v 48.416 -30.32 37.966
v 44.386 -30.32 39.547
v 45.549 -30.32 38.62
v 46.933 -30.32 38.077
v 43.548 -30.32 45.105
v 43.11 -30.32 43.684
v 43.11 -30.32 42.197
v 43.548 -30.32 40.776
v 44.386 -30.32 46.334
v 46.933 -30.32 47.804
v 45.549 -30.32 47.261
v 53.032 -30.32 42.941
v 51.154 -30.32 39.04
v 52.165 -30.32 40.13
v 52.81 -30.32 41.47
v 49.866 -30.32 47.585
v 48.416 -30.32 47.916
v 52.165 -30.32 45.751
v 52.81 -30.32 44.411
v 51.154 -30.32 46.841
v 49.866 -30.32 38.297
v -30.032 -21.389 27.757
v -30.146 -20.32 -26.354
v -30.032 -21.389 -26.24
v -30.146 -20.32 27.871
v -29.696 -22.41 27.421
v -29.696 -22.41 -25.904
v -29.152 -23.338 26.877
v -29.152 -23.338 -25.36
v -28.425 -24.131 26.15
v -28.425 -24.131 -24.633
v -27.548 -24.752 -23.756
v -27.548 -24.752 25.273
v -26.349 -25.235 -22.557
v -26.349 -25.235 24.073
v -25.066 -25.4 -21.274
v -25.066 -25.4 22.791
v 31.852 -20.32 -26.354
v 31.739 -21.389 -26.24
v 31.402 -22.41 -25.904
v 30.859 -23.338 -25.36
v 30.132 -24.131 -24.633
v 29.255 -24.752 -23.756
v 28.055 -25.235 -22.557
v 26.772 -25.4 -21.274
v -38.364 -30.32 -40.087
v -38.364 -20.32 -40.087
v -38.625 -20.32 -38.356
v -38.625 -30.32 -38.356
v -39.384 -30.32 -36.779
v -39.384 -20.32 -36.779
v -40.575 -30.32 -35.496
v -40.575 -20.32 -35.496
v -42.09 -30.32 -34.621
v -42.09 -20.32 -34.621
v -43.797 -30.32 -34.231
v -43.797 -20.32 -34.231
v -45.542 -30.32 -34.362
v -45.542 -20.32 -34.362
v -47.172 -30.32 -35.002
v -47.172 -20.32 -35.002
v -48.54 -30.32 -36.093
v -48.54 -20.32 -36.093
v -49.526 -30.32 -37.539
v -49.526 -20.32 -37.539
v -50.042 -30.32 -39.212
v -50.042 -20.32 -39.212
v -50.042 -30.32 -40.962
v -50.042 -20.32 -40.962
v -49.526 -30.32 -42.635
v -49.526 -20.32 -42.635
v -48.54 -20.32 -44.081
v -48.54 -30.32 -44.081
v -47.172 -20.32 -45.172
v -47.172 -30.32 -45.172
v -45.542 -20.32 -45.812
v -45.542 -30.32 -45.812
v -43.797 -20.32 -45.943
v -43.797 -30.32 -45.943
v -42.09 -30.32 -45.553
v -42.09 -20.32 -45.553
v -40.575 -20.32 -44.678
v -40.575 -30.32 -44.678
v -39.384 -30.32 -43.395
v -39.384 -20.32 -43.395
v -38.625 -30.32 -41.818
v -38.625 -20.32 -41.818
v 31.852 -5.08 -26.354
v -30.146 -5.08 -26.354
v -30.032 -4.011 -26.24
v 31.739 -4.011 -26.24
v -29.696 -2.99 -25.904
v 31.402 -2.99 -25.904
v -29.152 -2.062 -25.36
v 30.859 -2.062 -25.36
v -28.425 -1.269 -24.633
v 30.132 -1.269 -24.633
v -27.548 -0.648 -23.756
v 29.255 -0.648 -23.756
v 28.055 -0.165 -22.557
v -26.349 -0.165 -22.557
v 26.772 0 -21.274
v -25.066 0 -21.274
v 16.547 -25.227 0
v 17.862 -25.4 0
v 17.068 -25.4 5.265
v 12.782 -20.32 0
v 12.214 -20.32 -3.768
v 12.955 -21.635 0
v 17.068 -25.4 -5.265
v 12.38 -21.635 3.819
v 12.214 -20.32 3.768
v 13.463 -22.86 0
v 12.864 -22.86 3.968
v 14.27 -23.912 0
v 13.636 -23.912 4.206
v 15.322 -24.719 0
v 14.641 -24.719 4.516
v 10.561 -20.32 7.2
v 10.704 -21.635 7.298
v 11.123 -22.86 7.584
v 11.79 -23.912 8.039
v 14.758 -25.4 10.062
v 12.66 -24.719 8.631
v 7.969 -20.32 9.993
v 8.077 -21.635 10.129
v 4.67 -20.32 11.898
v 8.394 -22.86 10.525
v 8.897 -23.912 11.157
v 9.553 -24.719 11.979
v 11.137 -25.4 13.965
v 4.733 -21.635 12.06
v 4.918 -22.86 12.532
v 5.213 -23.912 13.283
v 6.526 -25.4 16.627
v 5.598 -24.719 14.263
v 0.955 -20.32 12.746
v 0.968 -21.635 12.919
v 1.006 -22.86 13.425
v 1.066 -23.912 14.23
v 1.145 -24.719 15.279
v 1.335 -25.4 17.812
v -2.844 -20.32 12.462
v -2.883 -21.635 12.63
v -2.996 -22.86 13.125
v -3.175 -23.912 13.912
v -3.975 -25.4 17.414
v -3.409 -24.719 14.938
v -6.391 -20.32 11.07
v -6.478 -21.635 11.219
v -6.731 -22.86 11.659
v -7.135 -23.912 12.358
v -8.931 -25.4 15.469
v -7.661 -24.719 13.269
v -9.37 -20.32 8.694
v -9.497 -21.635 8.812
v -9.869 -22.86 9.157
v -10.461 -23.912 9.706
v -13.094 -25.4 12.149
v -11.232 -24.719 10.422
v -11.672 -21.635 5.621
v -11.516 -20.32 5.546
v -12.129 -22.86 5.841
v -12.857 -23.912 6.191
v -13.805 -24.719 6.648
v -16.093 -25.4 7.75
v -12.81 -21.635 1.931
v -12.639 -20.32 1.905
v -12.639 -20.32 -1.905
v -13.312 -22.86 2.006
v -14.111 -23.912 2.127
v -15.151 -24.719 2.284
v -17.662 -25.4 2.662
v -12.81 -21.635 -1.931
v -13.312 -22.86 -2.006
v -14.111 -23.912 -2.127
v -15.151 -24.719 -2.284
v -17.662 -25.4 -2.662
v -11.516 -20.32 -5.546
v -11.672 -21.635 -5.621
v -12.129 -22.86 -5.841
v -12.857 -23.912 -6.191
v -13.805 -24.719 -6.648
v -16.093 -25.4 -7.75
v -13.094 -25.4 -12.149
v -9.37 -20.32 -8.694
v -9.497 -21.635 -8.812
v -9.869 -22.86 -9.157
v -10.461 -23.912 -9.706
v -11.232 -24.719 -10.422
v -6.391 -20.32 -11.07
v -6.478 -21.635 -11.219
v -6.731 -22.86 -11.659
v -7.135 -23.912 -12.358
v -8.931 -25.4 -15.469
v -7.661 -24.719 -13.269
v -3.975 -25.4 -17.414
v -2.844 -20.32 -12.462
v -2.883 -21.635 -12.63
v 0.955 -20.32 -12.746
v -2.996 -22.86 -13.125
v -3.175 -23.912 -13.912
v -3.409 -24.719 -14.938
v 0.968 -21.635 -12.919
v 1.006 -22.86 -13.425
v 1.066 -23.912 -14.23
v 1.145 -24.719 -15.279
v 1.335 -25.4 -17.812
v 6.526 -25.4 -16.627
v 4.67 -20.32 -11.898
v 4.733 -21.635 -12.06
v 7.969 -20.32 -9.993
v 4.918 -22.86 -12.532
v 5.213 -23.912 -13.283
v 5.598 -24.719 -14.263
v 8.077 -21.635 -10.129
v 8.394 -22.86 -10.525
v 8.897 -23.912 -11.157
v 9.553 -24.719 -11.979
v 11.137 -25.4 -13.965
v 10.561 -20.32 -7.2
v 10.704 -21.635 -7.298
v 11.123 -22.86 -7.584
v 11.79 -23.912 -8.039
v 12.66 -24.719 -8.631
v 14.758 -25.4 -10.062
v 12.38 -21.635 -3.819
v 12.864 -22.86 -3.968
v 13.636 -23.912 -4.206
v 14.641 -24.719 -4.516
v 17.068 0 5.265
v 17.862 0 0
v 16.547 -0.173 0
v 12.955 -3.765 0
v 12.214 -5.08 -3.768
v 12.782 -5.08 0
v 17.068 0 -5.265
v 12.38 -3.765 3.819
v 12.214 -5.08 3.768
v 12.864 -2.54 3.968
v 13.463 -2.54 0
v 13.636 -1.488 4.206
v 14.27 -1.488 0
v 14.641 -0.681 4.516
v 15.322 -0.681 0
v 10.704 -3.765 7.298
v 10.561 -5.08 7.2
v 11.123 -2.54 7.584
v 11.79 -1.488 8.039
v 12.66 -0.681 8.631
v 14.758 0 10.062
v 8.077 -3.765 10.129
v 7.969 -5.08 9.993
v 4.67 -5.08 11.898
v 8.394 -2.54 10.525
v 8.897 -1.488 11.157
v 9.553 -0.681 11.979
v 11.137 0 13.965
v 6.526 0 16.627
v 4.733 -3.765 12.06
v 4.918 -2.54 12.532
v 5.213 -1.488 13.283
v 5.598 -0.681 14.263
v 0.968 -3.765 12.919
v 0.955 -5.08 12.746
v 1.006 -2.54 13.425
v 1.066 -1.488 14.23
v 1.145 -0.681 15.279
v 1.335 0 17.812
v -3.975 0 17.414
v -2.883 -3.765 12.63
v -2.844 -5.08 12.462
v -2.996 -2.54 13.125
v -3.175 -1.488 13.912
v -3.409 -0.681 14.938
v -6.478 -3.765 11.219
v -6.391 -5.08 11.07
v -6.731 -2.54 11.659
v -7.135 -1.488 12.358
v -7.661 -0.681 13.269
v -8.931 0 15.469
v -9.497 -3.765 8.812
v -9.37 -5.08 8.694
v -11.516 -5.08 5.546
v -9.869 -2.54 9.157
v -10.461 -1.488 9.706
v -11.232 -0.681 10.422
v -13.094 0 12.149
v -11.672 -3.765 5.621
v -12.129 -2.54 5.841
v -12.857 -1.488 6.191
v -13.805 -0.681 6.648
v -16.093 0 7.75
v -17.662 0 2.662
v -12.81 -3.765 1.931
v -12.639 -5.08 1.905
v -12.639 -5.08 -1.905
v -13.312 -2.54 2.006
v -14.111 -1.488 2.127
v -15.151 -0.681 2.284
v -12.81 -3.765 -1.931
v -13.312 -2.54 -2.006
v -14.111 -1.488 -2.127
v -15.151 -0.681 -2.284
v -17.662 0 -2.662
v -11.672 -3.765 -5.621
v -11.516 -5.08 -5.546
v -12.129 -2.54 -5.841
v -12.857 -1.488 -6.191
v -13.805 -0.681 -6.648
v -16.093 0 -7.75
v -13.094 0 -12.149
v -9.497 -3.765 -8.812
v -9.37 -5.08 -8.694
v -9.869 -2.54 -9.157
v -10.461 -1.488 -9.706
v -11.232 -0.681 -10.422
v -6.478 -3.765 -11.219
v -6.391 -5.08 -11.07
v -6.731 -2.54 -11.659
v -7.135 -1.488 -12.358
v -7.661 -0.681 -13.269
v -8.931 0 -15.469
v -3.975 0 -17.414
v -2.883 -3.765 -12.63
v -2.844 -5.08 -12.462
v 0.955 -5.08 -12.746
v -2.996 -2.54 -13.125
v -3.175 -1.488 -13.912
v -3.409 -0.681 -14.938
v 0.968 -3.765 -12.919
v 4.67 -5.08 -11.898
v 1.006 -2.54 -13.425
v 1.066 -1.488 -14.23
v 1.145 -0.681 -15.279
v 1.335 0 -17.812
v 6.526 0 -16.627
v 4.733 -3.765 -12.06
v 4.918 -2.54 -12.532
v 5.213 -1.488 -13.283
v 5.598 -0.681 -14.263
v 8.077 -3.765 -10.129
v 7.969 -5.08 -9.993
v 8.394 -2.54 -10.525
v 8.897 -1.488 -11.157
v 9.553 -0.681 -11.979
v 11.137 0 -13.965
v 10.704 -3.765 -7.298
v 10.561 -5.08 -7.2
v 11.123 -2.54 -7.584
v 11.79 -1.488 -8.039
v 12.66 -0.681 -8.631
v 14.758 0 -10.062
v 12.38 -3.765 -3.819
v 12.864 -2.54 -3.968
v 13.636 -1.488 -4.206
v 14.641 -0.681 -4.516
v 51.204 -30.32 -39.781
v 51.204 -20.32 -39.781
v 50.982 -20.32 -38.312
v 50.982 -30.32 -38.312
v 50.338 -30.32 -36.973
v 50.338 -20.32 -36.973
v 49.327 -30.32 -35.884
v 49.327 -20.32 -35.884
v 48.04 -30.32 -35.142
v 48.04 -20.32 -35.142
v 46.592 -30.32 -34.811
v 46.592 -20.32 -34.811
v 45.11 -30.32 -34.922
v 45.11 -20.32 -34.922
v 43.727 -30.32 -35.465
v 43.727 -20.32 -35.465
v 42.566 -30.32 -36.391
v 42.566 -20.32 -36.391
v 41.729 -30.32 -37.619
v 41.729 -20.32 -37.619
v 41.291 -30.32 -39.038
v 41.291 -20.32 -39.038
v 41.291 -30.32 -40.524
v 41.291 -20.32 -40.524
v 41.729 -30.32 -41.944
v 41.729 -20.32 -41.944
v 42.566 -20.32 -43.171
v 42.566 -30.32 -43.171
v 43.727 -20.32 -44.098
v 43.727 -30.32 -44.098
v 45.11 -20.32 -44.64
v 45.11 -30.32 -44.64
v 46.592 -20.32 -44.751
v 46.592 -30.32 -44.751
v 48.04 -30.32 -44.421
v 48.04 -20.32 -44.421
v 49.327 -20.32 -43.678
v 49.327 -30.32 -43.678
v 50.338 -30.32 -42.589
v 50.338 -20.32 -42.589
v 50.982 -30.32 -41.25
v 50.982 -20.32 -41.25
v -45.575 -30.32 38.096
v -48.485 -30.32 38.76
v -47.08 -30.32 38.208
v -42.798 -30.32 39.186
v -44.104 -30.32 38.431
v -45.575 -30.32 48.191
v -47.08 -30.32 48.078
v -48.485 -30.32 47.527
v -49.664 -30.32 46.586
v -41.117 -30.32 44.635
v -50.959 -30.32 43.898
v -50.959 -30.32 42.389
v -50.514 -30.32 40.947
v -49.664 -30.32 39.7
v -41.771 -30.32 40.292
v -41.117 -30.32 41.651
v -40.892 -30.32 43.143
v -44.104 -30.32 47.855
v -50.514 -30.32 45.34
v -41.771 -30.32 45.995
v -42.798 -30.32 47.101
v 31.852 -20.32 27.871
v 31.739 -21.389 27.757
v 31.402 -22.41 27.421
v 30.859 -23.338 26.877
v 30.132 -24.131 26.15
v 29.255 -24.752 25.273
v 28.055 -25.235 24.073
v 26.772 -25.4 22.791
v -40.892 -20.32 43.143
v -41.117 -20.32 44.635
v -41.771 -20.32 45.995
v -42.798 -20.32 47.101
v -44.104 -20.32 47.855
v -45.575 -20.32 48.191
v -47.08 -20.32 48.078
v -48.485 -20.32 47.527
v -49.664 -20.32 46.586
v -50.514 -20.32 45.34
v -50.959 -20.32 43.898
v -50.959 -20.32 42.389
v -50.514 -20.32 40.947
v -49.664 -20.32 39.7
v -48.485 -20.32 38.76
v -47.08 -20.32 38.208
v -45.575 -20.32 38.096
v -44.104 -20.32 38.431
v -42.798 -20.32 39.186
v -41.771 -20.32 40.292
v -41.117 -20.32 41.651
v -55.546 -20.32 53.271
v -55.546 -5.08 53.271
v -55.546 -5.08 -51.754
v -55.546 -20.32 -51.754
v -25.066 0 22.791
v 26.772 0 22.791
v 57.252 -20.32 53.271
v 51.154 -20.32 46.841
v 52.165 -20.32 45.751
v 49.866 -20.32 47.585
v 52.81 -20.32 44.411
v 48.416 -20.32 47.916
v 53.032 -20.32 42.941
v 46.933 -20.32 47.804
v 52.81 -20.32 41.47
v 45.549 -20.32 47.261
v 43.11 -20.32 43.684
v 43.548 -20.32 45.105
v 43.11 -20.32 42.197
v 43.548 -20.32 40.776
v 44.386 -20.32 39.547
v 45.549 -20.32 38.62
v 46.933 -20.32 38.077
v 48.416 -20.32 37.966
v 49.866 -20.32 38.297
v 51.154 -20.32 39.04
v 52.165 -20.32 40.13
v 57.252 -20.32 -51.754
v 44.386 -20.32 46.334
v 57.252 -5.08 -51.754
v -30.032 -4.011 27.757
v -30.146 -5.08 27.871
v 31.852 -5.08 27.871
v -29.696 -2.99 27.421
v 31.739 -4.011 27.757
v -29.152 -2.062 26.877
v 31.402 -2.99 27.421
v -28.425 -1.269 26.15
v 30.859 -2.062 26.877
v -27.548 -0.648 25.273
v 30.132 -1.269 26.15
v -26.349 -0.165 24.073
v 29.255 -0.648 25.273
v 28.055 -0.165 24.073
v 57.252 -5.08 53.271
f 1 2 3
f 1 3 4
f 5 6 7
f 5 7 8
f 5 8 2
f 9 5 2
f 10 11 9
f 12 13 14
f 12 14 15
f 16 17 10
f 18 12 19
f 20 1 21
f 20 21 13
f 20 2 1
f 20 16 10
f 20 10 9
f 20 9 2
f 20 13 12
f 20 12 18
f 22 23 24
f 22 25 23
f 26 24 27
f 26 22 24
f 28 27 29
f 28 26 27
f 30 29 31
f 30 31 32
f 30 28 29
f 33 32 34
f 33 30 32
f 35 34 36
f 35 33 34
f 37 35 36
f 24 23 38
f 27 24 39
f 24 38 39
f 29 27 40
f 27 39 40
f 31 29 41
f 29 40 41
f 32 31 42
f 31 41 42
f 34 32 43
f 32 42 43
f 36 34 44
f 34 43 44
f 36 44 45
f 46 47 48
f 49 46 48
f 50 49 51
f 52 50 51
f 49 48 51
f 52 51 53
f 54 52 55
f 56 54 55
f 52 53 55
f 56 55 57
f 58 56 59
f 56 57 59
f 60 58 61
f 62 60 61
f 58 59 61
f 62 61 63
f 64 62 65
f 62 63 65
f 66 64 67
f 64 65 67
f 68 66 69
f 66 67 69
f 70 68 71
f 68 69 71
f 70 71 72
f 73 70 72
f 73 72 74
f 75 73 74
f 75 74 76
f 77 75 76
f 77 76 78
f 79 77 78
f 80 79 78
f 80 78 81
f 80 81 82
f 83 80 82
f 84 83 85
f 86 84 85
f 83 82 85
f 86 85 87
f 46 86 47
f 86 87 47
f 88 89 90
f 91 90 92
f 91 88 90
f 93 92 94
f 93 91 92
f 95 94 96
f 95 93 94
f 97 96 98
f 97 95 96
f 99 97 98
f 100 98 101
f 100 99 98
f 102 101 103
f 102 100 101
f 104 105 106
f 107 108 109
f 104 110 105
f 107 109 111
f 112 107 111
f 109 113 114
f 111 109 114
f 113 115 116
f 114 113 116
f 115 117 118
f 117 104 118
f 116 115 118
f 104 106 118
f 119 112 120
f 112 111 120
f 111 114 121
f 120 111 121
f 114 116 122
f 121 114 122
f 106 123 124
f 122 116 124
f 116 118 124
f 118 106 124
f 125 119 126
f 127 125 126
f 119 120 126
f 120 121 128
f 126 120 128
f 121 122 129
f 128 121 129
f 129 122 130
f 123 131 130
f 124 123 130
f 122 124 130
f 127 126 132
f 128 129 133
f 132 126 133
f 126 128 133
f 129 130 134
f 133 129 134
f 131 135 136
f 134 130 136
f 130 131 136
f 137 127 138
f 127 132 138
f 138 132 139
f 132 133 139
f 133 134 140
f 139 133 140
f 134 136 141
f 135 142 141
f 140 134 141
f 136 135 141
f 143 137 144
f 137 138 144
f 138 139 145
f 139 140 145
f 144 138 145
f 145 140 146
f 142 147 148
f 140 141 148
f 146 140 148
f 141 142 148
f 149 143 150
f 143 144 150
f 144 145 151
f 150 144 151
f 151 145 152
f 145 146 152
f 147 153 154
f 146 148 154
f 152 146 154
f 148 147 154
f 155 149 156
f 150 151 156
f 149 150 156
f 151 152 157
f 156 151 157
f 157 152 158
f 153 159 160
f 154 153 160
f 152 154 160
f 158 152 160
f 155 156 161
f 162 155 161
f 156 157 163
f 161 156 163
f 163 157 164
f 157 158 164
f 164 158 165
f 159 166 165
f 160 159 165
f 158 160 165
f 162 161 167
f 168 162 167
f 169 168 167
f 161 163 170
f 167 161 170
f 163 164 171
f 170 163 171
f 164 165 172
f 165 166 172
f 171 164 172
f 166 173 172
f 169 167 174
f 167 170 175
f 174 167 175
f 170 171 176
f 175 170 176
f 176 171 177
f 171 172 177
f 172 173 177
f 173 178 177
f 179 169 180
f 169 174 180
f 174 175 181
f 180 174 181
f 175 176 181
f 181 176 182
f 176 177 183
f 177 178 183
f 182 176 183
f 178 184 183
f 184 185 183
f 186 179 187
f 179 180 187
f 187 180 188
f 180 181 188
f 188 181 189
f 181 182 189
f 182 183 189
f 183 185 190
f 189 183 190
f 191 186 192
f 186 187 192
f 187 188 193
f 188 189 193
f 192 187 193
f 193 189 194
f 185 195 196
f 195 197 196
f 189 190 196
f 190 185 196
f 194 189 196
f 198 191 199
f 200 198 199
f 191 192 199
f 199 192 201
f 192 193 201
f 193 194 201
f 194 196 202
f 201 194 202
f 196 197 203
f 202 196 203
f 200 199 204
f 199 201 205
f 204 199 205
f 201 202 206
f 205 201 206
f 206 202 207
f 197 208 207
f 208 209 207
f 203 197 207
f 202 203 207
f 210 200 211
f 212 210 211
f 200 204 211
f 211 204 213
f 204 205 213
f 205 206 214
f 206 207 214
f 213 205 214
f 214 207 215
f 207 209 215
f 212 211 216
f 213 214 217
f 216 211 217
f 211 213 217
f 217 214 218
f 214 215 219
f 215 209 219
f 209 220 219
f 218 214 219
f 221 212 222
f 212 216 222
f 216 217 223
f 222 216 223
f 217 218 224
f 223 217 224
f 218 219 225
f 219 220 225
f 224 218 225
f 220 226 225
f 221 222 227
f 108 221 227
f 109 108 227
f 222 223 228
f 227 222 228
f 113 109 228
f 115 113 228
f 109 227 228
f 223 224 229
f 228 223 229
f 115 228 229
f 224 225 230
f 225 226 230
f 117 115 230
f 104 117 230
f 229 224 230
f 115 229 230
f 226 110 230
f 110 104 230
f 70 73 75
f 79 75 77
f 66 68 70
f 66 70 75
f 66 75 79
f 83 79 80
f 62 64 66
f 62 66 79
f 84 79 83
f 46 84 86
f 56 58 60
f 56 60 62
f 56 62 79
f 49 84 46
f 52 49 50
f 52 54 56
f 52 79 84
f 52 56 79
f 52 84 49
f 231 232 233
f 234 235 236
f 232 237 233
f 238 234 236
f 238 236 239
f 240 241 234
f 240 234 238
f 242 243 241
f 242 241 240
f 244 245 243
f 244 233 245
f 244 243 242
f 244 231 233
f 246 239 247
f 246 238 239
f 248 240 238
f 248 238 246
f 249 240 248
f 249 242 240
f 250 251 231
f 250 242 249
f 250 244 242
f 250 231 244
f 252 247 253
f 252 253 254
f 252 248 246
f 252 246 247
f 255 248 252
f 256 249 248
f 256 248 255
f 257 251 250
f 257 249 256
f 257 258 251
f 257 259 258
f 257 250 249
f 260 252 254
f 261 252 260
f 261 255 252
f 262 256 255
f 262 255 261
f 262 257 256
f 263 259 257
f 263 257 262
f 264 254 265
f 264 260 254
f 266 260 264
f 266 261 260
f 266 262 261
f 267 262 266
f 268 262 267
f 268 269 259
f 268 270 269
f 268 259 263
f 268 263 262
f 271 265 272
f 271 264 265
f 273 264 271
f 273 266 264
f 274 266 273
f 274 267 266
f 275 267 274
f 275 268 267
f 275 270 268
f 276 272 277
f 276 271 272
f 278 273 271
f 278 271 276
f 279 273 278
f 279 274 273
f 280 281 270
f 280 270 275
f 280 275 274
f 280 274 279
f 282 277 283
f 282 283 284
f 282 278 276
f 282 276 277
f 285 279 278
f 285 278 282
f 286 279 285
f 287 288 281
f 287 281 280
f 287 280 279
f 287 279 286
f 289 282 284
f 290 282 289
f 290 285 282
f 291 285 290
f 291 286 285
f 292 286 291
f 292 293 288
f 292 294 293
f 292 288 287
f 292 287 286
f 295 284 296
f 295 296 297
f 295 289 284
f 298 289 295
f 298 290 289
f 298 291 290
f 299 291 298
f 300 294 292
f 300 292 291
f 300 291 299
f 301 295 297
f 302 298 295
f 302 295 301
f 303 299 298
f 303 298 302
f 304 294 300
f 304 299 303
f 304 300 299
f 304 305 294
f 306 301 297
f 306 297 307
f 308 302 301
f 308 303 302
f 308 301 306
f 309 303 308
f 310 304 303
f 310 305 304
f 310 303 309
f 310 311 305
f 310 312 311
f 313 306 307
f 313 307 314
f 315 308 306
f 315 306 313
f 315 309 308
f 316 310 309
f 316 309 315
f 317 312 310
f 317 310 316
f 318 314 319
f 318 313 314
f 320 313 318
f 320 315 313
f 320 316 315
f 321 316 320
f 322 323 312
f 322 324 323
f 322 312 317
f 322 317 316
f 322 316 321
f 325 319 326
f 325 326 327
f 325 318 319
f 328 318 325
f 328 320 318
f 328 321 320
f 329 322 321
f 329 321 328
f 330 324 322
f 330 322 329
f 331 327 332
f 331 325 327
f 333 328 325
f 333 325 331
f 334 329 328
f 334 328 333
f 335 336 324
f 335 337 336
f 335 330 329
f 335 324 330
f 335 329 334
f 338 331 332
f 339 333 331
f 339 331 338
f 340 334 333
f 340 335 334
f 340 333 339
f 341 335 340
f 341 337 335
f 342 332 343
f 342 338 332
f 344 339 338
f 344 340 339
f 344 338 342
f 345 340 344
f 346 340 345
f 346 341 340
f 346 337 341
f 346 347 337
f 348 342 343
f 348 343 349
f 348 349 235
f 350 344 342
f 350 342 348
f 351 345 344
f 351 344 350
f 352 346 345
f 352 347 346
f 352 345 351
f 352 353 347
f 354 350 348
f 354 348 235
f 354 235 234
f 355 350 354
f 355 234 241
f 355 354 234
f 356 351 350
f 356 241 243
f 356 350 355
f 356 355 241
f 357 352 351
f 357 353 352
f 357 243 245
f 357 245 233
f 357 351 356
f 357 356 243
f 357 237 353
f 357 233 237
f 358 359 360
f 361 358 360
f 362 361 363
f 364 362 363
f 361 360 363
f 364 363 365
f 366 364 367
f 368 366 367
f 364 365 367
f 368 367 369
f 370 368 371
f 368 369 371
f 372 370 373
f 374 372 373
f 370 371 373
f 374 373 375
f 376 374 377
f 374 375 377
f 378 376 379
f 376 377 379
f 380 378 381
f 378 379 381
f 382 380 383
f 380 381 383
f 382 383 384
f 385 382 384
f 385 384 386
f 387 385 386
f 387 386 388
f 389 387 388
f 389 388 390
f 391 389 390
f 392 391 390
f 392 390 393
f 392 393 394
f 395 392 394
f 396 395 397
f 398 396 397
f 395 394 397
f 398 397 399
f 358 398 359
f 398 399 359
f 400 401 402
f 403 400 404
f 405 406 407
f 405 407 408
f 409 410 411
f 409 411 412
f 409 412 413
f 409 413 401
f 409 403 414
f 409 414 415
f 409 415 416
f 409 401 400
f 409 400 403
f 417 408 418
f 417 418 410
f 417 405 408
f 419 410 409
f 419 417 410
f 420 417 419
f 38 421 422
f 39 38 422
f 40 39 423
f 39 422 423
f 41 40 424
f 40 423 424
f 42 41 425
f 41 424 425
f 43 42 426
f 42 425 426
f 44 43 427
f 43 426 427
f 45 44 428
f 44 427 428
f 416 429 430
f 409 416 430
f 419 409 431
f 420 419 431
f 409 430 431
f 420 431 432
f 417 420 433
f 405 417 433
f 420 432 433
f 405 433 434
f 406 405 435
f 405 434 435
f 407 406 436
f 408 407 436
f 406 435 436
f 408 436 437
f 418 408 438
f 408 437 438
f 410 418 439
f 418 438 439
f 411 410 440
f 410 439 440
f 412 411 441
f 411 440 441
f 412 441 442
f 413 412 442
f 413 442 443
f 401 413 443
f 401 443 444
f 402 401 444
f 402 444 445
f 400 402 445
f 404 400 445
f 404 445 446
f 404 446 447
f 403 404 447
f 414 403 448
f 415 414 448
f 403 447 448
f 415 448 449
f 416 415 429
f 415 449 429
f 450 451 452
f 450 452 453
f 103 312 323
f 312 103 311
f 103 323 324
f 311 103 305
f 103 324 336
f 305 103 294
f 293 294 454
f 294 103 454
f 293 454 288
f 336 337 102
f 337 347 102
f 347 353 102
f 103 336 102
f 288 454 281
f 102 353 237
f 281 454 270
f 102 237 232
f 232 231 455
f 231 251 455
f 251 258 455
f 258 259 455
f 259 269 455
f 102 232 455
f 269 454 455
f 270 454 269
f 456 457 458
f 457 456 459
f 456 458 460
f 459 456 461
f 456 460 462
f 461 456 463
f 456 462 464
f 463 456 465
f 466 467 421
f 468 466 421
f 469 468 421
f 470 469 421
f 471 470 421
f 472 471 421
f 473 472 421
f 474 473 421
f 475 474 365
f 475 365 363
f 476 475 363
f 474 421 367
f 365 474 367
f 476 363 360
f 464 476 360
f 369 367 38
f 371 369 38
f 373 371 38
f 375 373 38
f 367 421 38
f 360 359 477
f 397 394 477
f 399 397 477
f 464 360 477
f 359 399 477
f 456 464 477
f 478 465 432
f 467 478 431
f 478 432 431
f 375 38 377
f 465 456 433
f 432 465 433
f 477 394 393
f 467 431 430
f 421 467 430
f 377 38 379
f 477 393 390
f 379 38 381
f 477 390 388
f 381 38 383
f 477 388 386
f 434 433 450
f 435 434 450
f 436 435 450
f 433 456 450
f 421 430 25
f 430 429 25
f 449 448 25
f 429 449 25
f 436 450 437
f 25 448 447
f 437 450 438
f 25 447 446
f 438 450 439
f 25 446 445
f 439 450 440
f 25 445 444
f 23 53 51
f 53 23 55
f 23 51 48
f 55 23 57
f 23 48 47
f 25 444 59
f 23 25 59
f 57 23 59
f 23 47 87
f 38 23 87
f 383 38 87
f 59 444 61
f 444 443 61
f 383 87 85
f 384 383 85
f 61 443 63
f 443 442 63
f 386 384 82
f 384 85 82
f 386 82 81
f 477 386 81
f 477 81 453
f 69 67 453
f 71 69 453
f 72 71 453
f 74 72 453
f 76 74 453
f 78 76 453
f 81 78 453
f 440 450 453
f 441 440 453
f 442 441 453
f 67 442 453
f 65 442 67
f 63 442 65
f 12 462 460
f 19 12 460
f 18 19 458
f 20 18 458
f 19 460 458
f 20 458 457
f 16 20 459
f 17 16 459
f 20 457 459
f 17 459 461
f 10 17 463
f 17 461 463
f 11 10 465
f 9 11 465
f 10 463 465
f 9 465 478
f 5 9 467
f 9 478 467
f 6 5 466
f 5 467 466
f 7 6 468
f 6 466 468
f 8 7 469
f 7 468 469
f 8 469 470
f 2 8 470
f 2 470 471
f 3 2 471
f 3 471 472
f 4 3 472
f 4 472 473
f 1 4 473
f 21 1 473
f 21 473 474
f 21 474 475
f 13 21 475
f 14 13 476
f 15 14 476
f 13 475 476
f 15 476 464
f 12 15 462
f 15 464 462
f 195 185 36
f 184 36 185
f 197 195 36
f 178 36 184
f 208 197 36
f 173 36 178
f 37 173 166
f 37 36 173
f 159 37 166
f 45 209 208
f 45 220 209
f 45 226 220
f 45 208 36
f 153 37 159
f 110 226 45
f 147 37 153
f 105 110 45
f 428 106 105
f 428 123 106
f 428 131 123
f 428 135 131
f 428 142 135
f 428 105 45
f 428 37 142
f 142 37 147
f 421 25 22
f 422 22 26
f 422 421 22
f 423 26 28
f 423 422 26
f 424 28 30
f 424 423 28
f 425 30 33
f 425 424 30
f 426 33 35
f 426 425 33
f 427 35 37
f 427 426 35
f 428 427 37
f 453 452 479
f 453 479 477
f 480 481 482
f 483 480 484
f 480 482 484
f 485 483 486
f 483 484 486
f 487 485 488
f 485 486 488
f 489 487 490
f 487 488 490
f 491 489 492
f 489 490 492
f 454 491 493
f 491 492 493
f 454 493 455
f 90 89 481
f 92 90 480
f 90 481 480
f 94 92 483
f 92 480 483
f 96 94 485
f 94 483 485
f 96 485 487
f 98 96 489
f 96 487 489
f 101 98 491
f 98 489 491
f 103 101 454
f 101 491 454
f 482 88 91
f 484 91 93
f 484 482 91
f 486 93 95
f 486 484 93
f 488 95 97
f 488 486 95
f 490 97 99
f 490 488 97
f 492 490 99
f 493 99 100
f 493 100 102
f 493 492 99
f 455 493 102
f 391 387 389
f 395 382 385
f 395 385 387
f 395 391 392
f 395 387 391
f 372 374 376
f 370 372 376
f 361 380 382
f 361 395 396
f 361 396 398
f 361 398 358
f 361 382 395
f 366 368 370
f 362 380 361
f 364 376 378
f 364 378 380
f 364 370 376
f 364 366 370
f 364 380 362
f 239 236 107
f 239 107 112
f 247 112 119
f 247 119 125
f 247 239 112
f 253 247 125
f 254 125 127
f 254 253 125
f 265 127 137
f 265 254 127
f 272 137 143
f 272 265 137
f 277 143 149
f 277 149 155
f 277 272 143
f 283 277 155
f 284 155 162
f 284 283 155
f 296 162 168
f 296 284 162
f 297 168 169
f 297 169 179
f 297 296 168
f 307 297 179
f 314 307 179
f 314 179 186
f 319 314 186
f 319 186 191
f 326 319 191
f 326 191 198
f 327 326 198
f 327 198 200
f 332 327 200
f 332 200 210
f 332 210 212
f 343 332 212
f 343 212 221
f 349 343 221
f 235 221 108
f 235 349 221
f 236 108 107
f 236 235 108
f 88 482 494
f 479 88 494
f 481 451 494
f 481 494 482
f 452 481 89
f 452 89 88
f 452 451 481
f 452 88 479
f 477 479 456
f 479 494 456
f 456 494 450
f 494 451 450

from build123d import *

# Parameters (mm, degrees)
F0_W     = 61.9982723147
F0_H     = 54.2247854173
F0_R     = 12.7819973787
F1_DEPTH = 25.4
F2_R     = 5.08
F3_DEPTH = 25.4
F4_DEPTH = 25.4
F5_DEPTH = 25.4
F6_DEPTH = 25.4
F7_R     = 5.0618882288
F7_R_2   = 4.9888661586
F7_R_3   = 4.9841843595
F7_R_4   = 5.8719562736
F8_DEPTH = 10


with BuildPart() as f1:
    # F0 (on Front) → F1 (new body)
    with BuildSketch(Plane.XZ):
        with Locations((0.8531874046, 0.758389011)):
            Rectangle(F0_W, F0_H)
        Circle(F0_R, mode=Mode.SUBTRACT)
    extrude(amount=F1_DEPTH)

    # F2
    f2_edges = [f1.edges().sort_by_distance(p)[0] for p in [
        (0.853187, -25.4, 27.870782),
        (-30.145949, -25.4, 0.758389),
        (0.853187, -25.4, -26.354004),
        (31.852324, -25.4, 0.758389),
        (-12.781997, -25.4, 0),
        (0.853187, 0, 27.870782),
        (-30.145949, 0, 0.758389),
        (0.853187, 0, -26.354004),
        (31.852324, 0, 0.758389),
        (-12.781997, 0, 0),
    ]]
    fillet(f2_edges, radius=F2_R)

    # F3 (add): a face of the model
    f3_faces = [f1.faces().sort_by_distance(p)[0] for p in [
        (0.8531874046, -12.7, 27.8707817197),
    ]]
    extrude(f3_faces, amount=F3_DEPTH)

    # F4 (add): a face of the model
    f4_faces = [f1.faces().sort_by_distance(p)[0] for p in [
        (0.8531874046, -12.7, -26.3540036976),
    ]]
    extrude(f4_faces, amount=F4_DEPTH)

    # F5 (add): a face of the model
    f5_faces = [f1.faces().sort_by_distance(p)[0] for p in [
        (-30.1459487528, -12.7, 0.758389011),
    ]]
    extrude(f5_faces, amount=F5_DEPTH)

    # F6 (add): a face of the model
    f6_faces = [f1.faces().sort_by_distance(p)[0] for p in [
        (31.8523235619, -12.7, 0.758389011),
    ]]
    extrude(f6_faces, amount=F6_DEPTH)

    # F7 (on face) → F8 (join)
    with BuildSketch(Plane.XZ.offset(20.32)):
        with Locations((-45.9536351264, 43.1434102356)):
            Circle(F7_R)
        with Locations((48.043269664, 42.9407022893)):
            Circle(F7_R_2)
        with Locations((46.2194345891, -39.781190455)):
            Circle(F7_R_3)
        with Locations((-44.2356690764, -40.0870218873)):
            Circle(F7_R_4)
    extrude(amount=F8_DEPTH)


solid = f1.part
